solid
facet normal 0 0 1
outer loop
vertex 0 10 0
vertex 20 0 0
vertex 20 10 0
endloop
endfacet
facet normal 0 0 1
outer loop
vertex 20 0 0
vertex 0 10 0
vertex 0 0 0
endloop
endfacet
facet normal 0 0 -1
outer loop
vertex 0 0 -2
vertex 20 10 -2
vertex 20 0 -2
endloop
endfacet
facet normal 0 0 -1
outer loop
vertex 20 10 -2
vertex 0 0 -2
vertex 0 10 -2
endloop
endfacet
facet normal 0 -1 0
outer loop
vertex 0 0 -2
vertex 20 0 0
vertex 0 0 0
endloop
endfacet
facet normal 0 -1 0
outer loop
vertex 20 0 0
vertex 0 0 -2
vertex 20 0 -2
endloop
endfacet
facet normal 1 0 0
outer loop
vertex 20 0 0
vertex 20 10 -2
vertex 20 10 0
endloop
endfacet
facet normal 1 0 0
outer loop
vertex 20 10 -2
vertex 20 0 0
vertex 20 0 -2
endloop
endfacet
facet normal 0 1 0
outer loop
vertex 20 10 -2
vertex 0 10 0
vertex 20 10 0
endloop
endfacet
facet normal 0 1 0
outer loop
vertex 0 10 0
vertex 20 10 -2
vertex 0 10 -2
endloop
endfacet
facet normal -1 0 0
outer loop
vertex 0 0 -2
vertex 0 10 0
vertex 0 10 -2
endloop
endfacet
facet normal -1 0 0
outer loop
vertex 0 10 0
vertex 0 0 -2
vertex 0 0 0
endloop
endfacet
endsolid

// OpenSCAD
surface("test.dat", convexity = 5);
translate([0,0,-2])
cube([20,10,2]);
